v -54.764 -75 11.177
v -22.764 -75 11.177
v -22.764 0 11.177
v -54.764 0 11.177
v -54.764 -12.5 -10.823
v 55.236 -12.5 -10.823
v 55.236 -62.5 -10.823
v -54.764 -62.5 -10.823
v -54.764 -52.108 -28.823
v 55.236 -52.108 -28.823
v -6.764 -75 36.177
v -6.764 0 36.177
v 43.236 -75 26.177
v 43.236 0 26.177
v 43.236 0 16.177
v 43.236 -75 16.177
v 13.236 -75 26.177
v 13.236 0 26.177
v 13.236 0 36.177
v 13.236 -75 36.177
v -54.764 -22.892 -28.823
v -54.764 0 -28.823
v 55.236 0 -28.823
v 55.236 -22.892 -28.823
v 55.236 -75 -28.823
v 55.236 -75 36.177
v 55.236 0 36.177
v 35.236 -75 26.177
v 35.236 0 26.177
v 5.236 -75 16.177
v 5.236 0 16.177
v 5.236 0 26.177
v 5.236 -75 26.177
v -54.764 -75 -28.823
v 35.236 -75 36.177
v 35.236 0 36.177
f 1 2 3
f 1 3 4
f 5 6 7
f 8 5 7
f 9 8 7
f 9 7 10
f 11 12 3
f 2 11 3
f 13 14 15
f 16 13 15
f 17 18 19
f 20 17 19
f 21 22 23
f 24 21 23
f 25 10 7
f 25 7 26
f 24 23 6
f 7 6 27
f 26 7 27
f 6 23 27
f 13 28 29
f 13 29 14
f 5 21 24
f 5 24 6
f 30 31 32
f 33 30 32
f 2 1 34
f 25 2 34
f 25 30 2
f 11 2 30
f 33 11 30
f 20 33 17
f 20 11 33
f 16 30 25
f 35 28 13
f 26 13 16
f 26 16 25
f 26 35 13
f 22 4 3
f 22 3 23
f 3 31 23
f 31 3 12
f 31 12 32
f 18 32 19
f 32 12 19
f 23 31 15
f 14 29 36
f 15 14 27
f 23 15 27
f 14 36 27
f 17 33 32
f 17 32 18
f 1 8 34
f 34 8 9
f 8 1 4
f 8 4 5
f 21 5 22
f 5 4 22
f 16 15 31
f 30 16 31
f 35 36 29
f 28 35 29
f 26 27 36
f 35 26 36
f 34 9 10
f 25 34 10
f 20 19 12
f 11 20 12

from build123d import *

# Parameters (mm, degrees)
F1_DEPTH = 75
F3_DEPTH = 110.001


with BuildPart() as f1:
    # F0 (on Front) → F1 (new body)
    with BuildSketch(Plane.XZ):
        Polygon((-54.763541, 11.177084), (-54.763541, -28.822916), (55.236459, -28.822916), (55.236459, 36.177084), (35.236459, 36.177084), (35.236459, 26.177084), (43.236459, 26.177084), (43.236459, 16.177084), (5.236459, 16.177084), (5.236459, 26.177084), (13.236459, 26.177084), (13.236459, 36.177084), (-6.763541, 36.177084), (-22.763541, 11.177084), align=None)
    extrude(amount=F1_DEPTH)

    # F2 (on face) → F3 (cut, through all)
    with BuildSketch(Plane.YZ.offset(55.236459)):
        Polygon((-12.5, -10.822916), (-62.5, -10.822916), (-52.107695, -28.822916), (-22.892305, -28.822916), align=None)
    extrude(amount=-F3_DEPTH, mode=Mode.SUBTRACT)


solid = f1.part
